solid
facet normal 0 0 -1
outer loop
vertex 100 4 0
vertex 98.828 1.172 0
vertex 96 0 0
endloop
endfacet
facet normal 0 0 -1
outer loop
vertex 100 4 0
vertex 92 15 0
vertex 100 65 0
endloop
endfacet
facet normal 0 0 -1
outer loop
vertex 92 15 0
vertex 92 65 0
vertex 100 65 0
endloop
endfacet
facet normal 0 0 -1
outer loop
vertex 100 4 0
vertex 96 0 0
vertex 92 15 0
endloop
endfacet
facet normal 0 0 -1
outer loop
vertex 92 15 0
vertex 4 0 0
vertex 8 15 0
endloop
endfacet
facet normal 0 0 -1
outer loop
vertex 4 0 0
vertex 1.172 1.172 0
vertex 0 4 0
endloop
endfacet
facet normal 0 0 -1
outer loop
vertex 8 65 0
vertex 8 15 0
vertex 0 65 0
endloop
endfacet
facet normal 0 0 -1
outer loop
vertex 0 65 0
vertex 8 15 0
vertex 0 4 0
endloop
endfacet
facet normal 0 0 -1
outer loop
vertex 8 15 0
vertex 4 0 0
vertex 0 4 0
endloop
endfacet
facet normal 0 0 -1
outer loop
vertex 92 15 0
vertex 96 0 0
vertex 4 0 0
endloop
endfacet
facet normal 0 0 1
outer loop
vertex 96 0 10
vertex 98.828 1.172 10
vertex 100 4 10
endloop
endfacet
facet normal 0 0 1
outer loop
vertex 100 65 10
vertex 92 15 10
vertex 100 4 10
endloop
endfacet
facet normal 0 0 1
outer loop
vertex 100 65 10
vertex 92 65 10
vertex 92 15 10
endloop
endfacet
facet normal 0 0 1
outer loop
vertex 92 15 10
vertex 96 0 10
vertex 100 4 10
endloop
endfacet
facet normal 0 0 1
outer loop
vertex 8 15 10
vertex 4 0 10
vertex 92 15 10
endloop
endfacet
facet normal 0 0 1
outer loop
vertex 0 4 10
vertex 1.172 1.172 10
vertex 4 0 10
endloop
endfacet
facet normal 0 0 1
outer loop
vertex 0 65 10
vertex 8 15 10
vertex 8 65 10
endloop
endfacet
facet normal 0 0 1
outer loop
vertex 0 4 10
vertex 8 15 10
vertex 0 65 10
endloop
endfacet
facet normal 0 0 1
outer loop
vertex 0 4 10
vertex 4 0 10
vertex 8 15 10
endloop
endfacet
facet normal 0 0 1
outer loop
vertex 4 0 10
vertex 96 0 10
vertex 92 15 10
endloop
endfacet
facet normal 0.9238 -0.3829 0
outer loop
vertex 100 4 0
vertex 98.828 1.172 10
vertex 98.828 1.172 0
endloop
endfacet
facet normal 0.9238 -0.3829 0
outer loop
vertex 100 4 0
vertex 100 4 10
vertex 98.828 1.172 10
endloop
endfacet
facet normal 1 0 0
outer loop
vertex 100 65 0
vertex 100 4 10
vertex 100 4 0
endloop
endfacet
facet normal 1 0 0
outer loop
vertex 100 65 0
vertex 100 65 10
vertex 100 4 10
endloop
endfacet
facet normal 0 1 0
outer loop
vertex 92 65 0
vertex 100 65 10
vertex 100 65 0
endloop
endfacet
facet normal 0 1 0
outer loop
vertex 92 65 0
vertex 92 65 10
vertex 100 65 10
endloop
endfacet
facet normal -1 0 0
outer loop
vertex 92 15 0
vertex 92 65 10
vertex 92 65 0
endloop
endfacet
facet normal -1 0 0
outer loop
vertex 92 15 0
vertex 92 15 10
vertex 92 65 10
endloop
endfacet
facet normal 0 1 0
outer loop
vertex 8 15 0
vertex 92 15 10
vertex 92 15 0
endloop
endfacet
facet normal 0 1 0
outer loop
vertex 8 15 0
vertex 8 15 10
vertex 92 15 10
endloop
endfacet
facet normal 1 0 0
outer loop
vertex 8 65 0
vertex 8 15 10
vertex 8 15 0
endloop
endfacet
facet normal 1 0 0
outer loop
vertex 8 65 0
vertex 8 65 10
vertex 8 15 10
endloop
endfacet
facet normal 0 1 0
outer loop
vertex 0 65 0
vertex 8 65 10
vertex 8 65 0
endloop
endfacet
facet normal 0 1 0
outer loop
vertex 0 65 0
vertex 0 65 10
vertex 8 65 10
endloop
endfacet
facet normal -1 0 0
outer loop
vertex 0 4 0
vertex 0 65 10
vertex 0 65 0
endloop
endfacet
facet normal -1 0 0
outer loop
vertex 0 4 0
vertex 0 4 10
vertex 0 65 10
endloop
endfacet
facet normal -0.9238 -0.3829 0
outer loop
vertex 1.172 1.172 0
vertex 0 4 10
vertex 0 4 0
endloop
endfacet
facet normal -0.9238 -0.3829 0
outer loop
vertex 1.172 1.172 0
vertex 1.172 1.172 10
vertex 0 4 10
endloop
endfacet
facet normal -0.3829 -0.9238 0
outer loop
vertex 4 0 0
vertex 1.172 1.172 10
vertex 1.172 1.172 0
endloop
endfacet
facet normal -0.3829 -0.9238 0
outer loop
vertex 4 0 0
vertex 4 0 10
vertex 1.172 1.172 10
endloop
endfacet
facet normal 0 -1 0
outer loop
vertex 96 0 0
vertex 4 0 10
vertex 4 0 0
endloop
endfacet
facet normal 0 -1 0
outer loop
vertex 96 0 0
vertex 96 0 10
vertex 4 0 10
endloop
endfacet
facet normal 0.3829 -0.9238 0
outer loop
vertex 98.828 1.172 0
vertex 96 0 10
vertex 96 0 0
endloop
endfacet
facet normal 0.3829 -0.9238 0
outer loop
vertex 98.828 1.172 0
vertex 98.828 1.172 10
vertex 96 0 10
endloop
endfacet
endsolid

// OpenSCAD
$fn = 32;

// ----------------------------------------------------------------------
// Heat sink frame: 100 x 65 mm frame, 8 mm walls
// ----------------------------------------------------------------------

// --- parameters (mm) ---
profile_height = 10;      // extrusion height
profile_points = 12;      // points of the closed outline

profile = [[0, 4], [1.172, 1.172], [4, 0], [96, 0], [98.828, 1.172], [100, 4], [100, 65], [92, 65], [92, 15], [8, 15], [8, 65], [0, 65]];  // single closed polygon, 12 points, counter clockwise

// --- the one profile operation ---
linear_extrude(height = profile_height) polygon(points = profile);
